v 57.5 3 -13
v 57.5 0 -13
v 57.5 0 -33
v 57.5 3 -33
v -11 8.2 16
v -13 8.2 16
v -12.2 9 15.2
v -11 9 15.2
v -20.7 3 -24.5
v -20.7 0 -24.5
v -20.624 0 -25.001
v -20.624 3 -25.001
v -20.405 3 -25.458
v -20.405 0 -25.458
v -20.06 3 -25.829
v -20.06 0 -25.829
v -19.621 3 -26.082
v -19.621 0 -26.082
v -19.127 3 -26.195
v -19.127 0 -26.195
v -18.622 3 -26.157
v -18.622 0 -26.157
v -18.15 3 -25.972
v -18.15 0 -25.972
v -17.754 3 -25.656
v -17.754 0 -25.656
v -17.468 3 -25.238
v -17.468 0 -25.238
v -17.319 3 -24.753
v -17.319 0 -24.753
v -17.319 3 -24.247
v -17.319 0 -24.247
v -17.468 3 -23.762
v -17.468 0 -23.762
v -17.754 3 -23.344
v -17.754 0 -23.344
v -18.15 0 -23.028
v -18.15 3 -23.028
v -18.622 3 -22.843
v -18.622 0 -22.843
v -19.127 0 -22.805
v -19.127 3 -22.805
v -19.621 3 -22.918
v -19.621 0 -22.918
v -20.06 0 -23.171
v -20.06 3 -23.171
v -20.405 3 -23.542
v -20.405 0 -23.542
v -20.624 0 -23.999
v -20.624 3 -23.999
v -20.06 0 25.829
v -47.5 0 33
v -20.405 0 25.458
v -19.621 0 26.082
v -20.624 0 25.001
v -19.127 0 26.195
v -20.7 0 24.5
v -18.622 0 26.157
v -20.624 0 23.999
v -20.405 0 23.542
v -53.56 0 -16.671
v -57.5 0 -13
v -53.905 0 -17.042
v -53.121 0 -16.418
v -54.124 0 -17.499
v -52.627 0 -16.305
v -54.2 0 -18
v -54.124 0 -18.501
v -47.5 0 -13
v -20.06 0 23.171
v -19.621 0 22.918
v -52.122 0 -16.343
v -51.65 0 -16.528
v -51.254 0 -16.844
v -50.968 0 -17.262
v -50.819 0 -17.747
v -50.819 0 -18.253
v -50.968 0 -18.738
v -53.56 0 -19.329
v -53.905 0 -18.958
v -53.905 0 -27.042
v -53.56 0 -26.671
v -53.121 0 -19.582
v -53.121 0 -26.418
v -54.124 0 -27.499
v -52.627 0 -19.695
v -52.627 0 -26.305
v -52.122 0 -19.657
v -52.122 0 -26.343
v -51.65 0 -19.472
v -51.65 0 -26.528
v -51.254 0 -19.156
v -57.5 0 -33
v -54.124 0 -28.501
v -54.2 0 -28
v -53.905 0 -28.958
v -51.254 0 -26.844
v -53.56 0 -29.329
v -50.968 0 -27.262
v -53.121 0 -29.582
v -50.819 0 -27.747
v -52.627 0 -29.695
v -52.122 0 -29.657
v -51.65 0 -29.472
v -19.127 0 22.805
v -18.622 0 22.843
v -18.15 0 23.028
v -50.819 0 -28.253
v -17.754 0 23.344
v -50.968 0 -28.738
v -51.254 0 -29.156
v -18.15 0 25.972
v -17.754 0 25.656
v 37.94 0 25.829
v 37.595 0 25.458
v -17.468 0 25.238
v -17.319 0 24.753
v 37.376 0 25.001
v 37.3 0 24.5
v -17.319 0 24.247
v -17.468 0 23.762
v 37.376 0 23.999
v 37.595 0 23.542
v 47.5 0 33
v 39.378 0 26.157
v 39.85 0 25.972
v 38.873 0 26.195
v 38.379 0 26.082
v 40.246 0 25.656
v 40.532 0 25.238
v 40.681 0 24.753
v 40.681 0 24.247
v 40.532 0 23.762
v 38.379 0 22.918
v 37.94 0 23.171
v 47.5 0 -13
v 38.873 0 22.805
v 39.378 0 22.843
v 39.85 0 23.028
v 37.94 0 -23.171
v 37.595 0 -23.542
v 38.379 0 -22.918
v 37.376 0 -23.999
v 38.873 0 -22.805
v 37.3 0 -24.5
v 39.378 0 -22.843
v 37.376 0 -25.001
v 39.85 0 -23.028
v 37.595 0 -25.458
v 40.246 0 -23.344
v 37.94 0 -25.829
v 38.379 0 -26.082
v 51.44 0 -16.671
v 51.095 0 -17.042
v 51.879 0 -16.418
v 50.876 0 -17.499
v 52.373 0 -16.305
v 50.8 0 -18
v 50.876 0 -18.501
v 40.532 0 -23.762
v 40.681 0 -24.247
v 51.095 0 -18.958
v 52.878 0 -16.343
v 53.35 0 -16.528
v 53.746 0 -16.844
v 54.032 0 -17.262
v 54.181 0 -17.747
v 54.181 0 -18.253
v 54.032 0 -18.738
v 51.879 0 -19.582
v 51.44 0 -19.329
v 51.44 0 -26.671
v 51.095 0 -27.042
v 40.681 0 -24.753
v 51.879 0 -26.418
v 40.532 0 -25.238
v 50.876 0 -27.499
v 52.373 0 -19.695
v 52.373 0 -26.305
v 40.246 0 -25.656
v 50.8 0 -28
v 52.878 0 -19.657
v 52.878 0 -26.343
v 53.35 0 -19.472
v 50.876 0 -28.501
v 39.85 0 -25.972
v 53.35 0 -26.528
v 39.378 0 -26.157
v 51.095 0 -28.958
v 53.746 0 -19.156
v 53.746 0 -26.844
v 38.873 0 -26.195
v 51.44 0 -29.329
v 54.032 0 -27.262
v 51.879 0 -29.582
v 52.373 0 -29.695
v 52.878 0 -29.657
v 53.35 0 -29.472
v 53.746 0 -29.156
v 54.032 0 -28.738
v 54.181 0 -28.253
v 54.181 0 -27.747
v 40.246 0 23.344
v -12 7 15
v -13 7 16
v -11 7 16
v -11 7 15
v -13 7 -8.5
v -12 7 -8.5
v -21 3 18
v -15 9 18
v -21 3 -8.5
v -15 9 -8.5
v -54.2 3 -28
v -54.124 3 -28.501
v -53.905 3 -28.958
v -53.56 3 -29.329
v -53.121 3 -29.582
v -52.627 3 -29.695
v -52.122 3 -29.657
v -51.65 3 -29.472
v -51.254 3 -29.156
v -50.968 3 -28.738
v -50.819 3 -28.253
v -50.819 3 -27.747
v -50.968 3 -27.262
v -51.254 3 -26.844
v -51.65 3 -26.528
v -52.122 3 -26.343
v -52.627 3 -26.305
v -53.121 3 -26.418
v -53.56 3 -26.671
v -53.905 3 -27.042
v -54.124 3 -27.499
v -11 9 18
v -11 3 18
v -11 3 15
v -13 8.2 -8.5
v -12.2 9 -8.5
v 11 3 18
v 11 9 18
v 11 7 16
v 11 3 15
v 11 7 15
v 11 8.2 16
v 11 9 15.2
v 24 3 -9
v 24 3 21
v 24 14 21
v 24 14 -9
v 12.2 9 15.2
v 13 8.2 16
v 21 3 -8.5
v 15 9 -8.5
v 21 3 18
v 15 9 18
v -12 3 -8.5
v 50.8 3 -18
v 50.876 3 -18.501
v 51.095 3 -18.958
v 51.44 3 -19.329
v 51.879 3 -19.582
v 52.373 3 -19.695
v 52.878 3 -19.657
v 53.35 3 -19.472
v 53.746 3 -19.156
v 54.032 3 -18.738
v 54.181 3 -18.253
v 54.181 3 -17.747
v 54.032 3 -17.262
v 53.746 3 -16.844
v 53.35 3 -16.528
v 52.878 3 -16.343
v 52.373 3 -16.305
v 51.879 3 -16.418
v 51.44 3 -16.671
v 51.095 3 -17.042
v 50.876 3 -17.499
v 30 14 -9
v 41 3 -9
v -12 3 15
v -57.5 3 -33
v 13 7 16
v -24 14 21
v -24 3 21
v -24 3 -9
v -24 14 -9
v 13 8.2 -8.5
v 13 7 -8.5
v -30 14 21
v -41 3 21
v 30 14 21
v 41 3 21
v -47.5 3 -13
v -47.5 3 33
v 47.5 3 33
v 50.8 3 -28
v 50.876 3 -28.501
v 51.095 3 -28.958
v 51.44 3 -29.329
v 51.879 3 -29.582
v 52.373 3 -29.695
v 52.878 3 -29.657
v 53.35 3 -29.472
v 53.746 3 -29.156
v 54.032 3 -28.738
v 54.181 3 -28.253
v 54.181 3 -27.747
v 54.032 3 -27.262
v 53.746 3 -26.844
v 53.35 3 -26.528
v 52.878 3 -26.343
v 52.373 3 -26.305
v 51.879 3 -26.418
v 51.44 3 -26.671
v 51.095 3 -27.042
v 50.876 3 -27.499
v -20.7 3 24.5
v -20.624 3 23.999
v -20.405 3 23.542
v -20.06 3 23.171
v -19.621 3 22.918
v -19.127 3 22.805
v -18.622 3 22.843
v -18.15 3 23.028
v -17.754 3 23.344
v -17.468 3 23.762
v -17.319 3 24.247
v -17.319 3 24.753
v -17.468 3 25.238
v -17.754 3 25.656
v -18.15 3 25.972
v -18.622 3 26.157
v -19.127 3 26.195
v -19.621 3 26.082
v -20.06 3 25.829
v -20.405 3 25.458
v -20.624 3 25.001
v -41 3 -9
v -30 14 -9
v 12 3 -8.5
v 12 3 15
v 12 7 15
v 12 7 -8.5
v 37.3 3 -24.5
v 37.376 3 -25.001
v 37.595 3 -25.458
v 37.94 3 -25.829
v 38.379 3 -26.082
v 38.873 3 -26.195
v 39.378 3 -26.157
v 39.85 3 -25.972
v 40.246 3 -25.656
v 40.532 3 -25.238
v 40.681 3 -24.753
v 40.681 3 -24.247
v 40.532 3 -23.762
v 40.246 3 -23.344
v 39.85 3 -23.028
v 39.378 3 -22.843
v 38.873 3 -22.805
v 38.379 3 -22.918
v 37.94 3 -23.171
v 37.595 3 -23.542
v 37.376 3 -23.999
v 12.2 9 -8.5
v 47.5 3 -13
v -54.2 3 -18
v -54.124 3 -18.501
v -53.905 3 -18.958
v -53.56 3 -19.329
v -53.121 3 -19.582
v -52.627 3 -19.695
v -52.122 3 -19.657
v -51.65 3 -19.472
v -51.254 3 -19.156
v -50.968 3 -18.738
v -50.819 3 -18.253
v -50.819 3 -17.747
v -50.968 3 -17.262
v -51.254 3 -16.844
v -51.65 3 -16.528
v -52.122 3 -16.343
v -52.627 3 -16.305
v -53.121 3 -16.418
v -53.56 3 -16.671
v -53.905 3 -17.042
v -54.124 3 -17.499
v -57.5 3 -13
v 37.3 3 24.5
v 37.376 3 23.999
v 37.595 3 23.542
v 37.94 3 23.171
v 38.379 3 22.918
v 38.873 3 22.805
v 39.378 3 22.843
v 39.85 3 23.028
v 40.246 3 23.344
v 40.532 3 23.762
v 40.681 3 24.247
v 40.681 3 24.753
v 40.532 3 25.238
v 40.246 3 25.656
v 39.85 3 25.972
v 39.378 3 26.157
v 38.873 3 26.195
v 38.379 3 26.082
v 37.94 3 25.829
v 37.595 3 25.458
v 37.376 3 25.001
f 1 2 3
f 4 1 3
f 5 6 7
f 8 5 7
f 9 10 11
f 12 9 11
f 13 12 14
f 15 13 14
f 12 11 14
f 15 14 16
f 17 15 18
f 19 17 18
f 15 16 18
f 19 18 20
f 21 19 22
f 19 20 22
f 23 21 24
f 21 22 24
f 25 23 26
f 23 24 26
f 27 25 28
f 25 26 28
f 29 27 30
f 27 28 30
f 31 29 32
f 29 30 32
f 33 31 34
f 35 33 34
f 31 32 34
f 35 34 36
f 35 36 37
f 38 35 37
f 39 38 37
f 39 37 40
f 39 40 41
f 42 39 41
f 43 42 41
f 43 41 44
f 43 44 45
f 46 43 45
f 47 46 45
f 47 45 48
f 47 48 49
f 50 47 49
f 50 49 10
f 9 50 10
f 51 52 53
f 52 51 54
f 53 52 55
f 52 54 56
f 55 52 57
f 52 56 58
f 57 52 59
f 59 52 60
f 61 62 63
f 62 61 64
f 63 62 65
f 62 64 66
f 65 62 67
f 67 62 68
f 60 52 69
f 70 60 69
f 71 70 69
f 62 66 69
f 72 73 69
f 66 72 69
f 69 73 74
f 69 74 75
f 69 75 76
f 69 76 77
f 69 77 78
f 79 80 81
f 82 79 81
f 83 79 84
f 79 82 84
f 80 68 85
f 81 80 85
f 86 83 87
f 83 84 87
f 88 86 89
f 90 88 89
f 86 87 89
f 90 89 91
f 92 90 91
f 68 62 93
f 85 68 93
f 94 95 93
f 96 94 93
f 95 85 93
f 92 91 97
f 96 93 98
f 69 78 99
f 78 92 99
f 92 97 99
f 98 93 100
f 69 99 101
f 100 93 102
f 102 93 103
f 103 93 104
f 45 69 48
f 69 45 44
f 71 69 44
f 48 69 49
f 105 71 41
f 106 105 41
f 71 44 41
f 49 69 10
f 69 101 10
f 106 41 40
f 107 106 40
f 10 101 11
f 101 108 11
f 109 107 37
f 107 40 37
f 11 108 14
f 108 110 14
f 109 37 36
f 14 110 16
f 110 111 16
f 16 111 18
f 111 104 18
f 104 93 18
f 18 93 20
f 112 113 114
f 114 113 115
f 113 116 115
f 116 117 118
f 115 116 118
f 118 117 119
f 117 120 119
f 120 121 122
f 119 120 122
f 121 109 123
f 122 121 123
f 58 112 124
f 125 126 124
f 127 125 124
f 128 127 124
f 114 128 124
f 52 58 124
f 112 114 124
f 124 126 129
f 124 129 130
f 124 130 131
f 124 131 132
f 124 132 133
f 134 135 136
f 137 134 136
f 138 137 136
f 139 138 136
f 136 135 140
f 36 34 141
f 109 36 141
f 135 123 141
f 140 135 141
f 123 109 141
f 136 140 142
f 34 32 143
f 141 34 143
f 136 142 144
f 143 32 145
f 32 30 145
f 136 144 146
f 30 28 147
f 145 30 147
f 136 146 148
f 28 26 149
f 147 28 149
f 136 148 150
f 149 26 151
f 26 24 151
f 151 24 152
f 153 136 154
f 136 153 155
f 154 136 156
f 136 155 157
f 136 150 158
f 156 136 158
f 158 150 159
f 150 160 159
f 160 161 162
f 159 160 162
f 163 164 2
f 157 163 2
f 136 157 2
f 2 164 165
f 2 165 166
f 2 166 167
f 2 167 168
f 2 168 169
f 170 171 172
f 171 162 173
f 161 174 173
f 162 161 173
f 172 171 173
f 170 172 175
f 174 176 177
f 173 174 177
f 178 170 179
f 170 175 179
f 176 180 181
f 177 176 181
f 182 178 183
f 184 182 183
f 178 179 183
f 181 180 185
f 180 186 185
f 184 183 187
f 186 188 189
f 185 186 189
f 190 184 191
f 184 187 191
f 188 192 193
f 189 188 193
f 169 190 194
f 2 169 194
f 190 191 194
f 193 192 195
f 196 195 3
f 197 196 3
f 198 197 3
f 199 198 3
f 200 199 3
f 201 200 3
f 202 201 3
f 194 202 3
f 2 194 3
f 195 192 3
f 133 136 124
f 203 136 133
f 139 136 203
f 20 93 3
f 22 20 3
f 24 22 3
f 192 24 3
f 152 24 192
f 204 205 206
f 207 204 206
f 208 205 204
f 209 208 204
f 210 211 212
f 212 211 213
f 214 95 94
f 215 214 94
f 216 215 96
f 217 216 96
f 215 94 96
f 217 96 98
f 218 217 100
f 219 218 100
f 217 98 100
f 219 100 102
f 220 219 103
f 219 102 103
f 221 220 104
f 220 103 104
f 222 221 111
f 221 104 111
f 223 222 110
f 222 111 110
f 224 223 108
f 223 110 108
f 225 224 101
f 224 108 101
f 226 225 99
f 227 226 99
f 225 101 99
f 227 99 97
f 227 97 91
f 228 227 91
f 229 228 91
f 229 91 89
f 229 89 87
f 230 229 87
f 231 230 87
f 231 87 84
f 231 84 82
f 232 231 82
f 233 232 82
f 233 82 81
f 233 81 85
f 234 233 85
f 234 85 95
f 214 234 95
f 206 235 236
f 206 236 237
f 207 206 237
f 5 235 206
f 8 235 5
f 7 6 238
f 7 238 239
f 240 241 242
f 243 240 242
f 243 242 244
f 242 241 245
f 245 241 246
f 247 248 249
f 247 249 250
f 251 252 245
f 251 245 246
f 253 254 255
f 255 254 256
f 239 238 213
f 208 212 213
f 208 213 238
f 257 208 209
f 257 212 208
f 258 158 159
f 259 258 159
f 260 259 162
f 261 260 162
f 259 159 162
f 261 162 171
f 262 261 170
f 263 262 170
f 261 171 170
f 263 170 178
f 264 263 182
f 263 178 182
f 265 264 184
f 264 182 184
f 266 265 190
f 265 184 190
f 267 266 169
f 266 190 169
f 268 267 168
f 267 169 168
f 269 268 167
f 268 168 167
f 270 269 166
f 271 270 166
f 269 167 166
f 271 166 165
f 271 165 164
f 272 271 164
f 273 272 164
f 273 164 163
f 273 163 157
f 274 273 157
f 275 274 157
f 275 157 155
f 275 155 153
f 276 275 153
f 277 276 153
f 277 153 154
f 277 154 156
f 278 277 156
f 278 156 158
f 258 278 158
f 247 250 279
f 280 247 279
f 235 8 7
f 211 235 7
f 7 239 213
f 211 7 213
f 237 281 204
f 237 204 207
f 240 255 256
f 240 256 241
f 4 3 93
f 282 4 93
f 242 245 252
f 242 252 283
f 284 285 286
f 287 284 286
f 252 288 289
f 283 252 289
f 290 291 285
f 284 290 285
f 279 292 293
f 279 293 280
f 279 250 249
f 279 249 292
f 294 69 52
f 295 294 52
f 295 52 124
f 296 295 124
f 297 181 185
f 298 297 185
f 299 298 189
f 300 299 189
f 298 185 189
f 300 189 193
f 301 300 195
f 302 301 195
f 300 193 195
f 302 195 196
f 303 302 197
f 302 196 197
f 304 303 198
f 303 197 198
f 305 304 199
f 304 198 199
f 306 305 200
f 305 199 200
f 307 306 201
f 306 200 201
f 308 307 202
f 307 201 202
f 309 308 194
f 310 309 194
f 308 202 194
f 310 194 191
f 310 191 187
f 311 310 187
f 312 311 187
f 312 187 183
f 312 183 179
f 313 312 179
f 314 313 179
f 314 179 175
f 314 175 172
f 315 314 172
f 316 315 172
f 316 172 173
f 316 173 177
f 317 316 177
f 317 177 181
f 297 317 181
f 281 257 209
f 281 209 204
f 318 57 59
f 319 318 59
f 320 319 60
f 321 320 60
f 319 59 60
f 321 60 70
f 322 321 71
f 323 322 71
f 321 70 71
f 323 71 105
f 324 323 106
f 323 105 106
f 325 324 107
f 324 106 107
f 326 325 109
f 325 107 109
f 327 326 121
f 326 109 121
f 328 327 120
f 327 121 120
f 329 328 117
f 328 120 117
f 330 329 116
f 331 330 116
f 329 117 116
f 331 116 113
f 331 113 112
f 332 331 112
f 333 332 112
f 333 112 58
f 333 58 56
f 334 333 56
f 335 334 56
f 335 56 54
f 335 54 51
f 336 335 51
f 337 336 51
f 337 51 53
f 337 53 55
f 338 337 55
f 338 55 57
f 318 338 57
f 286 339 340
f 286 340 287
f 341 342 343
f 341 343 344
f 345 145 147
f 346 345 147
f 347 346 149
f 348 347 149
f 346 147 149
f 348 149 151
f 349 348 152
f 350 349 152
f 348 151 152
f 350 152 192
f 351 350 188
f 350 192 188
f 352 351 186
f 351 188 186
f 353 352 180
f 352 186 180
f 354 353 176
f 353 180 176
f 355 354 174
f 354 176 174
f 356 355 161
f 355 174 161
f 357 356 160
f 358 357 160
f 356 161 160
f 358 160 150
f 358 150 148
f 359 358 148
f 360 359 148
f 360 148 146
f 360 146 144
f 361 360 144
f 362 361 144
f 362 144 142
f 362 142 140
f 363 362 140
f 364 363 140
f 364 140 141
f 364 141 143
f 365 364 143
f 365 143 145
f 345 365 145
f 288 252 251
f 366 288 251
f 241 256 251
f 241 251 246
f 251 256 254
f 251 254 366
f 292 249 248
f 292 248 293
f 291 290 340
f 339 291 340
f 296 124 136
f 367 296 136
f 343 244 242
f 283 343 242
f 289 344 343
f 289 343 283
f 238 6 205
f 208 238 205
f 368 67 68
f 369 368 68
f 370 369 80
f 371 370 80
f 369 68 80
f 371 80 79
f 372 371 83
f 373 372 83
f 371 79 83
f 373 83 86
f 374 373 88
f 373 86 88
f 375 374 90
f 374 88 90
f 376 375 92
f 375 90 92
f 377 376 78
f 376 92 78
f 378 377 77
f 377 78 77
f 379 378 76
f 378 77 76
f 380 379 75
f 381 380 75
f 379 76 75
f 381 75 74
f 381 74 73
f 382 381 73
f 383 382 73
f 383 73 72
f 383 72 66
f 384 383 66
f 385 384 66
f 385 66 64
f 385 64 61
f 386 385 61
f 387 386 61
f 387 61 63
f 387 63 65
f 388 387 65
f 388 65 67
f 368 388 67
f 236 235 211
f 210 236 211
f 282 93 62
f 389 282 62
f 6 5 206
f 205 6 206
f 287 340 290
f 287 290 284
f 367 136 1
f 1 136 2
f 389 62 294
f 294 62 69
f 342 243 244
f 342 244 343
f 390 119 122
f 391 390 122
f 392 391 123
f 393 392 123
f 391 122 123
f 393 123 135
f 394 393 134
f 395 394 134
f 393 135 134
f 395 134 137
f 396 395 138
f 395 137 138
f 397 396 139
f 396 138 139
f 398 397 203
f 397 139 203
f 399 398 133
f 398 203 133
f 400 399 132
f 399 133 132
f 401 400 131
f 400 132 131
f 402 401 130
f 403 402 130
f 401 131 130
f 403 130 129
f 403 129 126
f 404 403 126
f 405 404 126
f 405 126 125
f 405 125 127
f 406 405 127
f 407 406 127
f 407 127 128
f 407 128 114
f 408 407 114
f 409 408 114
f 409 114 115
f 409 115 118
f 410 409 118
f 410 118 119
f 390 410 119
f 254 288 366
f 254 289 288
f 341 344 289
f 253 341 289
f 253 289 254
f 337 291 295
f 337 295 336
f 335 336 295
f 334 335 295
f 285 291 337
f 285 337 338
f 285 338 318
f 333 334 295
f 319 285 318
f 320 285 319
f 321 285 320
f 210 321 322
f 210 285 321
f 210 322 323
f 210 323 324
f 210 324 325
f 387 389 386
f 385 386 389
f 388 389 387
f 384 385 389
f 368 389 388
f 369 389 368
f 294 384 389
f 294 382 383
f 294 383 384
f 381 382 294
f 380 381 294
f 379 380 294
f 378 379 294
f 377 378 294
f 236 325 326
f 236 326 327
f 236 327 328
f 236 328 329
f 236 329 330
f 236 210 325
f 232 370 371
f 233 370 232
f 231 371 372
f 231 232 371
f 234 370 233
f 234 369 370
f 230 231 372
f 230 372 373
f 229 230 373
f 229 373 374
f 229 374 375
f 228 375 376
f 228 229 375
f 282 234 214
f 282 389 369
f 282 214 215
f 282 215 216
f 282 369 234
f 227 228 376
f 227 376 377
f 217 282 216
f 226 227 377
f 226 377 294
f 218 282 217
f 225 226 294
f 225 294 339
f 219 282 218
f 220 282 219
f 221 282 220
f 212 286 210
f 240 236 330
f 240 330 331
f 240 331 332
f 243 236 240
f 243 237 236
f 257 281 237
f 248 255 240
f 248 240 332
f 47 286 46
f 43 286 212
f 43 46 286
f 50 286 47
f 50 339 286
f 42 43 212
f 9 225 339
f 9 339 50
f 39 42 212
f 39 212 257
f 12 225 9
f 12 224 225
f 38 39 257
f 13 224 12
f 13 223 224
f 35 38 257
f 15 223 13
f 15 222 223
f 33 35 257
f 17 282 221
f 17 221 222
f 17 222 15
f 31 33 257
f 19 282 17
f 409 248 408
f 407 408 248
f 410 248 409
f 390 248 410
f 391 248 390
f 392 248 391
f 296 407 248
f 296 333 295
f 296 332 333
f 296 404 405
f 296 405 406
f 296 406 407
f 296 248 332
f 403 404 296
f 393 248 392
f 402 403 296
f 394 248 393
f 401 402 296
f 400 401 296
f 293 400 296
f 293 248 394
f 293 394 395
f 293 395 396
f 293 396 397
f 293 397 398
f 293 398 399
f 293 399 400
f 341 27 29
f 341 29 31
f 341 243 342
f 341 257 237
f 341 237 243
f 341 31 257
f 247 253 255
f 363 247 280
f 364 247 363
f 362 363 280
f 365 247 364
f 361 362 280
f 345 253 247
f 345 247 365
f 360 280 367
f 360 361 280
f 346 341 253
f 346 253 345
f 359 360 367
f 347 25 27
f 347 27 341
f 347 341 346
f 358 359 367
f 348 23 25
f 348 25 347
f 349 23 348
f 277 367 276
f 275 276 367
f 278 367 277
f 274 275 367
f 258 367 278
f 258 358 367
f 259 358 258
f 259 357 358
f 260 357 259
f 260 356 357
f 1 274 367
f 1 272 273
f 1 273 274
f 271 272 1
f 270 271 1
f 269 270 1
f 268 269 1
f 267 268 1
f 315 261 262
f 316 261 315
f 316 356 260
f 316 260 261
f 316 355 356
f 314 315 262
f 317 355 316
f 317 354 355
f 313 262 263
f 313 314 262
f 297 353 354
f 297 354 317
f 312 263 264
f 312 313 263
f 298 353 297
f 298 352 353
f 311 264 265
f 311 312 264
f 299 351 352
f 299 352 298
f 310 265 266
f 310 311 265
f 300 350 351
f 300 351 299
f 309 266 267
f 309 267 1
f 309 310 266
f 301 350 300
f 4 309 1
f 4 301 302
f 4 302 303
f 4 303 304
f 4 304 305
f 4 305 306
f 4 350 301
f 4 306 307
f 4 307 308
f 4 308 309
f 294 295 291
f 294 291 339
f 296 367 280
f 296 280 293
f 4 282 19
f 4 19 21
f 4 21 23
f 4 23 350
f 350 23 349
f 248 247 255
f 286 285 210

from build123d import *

# Parameters (mm, degrees)
BOSS_EXTRUDE1_DEPTH  = 3
M3_CLEARANCE_HOLE1_D = 3.4
M3_CLEARANCE_HOLE2_D = 3.4
EXTRUDE_THIN1_DEPTH  = 6
SKETCH9_W            = 1
SKETCH9_H            = 1.2
CHAMFER1_SIZE        = 1
SKETCH11_W           = 22
SKETCH11_H           = 3
CUT_EXTRUDE1_DEPTH   = 6
SKETCH12_W           = 6
SKETCH12_H           = 30
BOSS_EXTRUDE3_DEPTH  = 11
CHAMFER2_SIZE        = 6
CHAMFER3_SIZE        = 11


# Some blends are built 0.0001 mm under size
with BuildPart() as part:
    # Sketch1 → Boss-Extrude1 (new body)
    with BuildSketch(Plane(origin=(0, 0, 0), x_dir=(1, 0, 0), z_dir=(0, 1, 0))):
        Polygon((-57.5, 33), (-57.5, 13), (-47.5, 13), (-47.5, -33), (47.5, -33), (47.5, 13), (57.5, 13), (57.5, 33), align=None)
    extrude(amount=BOSS_EXTRUDE1_DEPTH)

    # M3 Clearance Hole1 (through all)
    with Locations(Plane(origin=(0, 3, 0), x_dir=(1, 0, 0), z_dir=(0, 1, 0))):
        with Locations((-52.5, 28), (-52.5, 18), (52.5, 28), (52.5, 18)):
            Hole(M3_CLEARANCE_HOLE1_D / 2)

    # M3 Clearance Hole2 (through all)
    with Locations(Plane(origin=(0, 3, 0), x_dir=(1, 0, 0), z_dir=(0, 1, 0))):
        with Locations((-19, 24.5), (-19, -24.5), (39, -24.5), (39, 24.5)):
            Hole(M3_CLEARANCE_HOLE2_D / 2)

    # Sketch8 → Extrude-Thin1 (add)
    with BuildSketch(Plane(origin=(0, 3, 0), x_dir=(1, 0, 0), z_dir=(0, 1, 0))):
        Polygon((-12, 8.5), (-12, -15), (12, -15), (12, 8.5), (15, 8.5), (15, -18), (-15, -18), (-15, 8.5), align=None)
    extrude(amount=EXTRUDE_THIN1_DEPTH)

    # Cut-Sweep1: sweep along a path in Sketch10
    with BuildLine(Plane(origin=(0, 7.6, 0), x_dir=(1, 0, 0), z_dir=(0, 1, 0))) as cut_sweep1_path:
        Line((12, 8.5), (12, -15))
        Line((12, -15), (-12, -15))
        Line((-12, -15), (-12, 8.5))
    # Sketch9 → Cut-Sweep1 (sweep, cut)
    with BuildSketch(Plane(origin=(0, 0, -8.5), x_dir=(-1, 0, 0), z_dir=(0, 0, -1))):
        with Locations((-12.5, 7.6)):
            Rectangle(SKETCH9_W, SKETCH9_H)
    sweep(path=cut_sweep1_path.line, transition=Transition.RIGHT, mode=Mode.SUBTRACT)

    # Chamfer1
    # the kernel refuses this chamfer: 1 mm, written as the material it takes off along each edge
    with BuildSketch(Plane(origin=(-12, 8.2, 15), x_dir=(-0.9996219169112968, -0.0274958766105856, 0), z_dir=(0, 0, -1))) as chamfer1_piece_1_section:
        Polygon((CHAMFER1_SIZE * 0.999621916911, CHAMFER1_SIZE * 0.0274958766106), (-CHAMFER1_SIZE * 0.0274958766106, CHAMFER1_SIZE * 0.999621916911), (0, 0), align=None)
    chamfer1_piece_1 = extrude(amount=26.071682988, mode=Mode.PRIVATE)
    chamfer1_piece_1 = split(chamfer1_piece_1, bisect_by=Plane(origin=(-13, 8.530404154, 1.964158506), z_dir=(1, 0, 0)), keep=Keep.TOP, mode=Mode.PRIVATE)
    add(chamfer1_piece_1, mode=Mode.SUBTRACT)
    with BuildSketch(Plane(origin=(12, 8.2, 15), x_dir=(0, -0.0274958766105856, 0.9996219169112968), z_dir=(-1, 0, 0))) as chamfer1_piece_2_section:
        Polygon((CHAMFER1_SIZE * 0.999621916911, CHAMFER1_SIZE * 0.0274958766106), (-CHAMFER1_SIZE * 0.0274958766106, CHAMFER1_SIZE * 0.999621916911), (0, 0), align=None)
    chamfer1_piece_2 = extrude(amount=24, mode=Mode.PRIVATE)
    chamfer1_piece_2 = split(chamfer1_piece_2, bisect_by=Plane(origin=(0, 8.530404154, 16), z_dir=(0, 0, -1)), keep=Keep.TOP, mode=Mode.PRIVATE)
    add(chamfer1_piece_2, mode=Mode.SUBTRACT)
    with BuildSketch(Plane(origin=(12, 8.2, -11.071682988), x_dir=(0.9996219169112968, -0.027495876610585647, 0), z_dir=(0, 0, 1))) as chamfer1_piece_3_section:
        Polygon((CHAMFER1_SIZE * 0.999621916911, CHAMFER1_SIZE * 0.0274958766106), (-CHAMFER1_SIZE * 0.0274958766106, CHAMFER1_SIZE * 0.999621916911), (0, 0), align=None)
    chamfer1_piece_3 = extrude(amount=26.071682988, mode=Mode.PRIVATE)
    chamfer1_piece_3 = split(chamfer1_piece_3, bisect_by=Plane(origin=(13, 8.530404154, 1.964158506), z_dir=(-1, 0, 0)), keep=Keep.TOP, mode=Mode.PRIVATE)
    add(chamfer1_piece_3, mode=Mode.SUBTRACT)
    with BuildSketch(Plane(origin=(-12, 8.2, 17.571682988), x_dir=(-0.9996219169112968, -0.027495876610585647, 0), z_dir=(0, 0, -1))) as chamfer1_piece_4a_section:
        Polygon((CHAMFER1_SIZE * 0.999621916911, CHAMFER1_SIZE * 0.0274958766106), (-CHAMFER1_SIZE * 0.0274958766106, CHAMFER1_SIZE * 0.999621916911), (0, 0), align=None)
    chamfer1_piece_4a = extrude(amount=28.643365976, mode=Mode.PRIVATE)
    chamfer1_piece_4a = split(chamfer1_piece_4a, bisect_by=Plane(origin=(-13, 8.530404154, 15.5), z_dir=(1, 0, 0)), keep=Keep.TOP, mode=Mode.PRIVATE)
    chamfer1_piece_4a = split(chamfer1_piece_4a, bisect_by=Plane(origin=(-12.328634334, 8.530404154, 16), z_dir=(0, 0, -1)), keep=Keep.TOP, mode=Mode.PRIVATE)
    chamfer1_piece_4a = split(chamfer1_piece_4a, bisect_by=Plane(origin=(-12.328634334, 8.530404154, 15), z_dir=(0, 0, 1)), keep=Keep.TOP, mode=Mode.PRIVATE)
    with BuildSketch(Plane(origin=(12, 8.2, 15), x_dir=(0, -0.0274958766105856, 0.9996219169112968), z_dir=(-1, 0, 0))) as chamfer1_piece_4b_section:
        Polygon((CHAMFER1_SIZE * 0.999621916911, CHAMFER1_SIZE * 0.0274958766106), (-CHAMFER1_SIZE * 0.0274958766106, CHAMFER1_SIZE * 0.999621916911), (0, 0), align=None)
    chamfer1_piece_4b = extrude(amount=26.571682988, mode=Mode.PRIVATE)
    chamfer1_piece_4b = split(chamfer1_piece_4b, bisect_by=Plane(origin=(-13, 8.530404154, 15.328634334), z_dir=(1, 0, 0)), keep=Keep.TOP, mode=Mode.PRIVATE)
    chamfer1_piece_4b = split(chamfer1_piece_4b, bisect_by=Plane(origin=(-12.5, 8.530404154, 16), z_dir=(0, 0, -1)), keep=Keep.TOP, mode=Mode.PRIVATE)
    chamfer1_piece_4b = split(chamfer1_piece_4b, bisect_by=Plane(origin=(-12, 8.530404154, 15.328634334), z_dir=(-1, 0, 0)), keep=Keep.TOP, mode=Mode.PRIVATE)
    chamfer1_piece_4 = chamfer1_piece_4a & chamfer1_piece_4b
    add(chamfer1_piece_4, mode=Mode.SUBTRACT)
    with BuildSketch(Plane(origin=(12, 8.2, -11.071682988), x_dir=(0.9996219169112968, -0.027495876610585647, 0), z_dir=(0, 0, 1))) as chamfer1_piece_5a_section:
        Polygon((CHAMFER1_SIZE * 0.999621916911, CHAMFER1_SIZE * 0.0274958766106), (-CHAMFER1_SIZE * 0.0274958766106, CHAMFER1_SIZE * 0.999621916911), (0, 0), align=None)
    chamfer1_piece_5a = extrude(amount=28.643365976, mode=Mode.PRIVATE)
    chamfer1_piece_5a = split(chamfer1_piece_5a, bisect_by=Plane(origin=(13, 8.530404154, 15.5), z_dir=(-1, 0, 0)), keep=Keep.TOP, mode=Mode.PRIVATE)
    chamfer1_piece_5a = split(chamfer1_piece_5a, bisect_by=Plane(origin=(12.328634334, 8.530404154, 16), z_dir=(0, 0, -1)), keep=Keep.TOP, mode=Mode.PRIVATE)
    chamfer1_piece_5a = split(chamfer1_piece_5a, bisect_by=Plane(origin=(12.328634334, 8.530404154, 15), z_dir=(0, 0, 1)), keep=Keep.TOP, mode=Mode.PRIVATE)
    with BuildSketch(Plane(origin=(14.571682988, 8.2, 15), x_dir=(0, -0.0274958766105856, 0.9996219169112968), z_dir=(-1, 0, 0))) as chamfer1_piece_5b_section:
        Polygon((CHAMFER1_SIZE * 0.999621916911, CHAMFER1_SIZE * 0.0274958766106), (-CHAMFER1_SIZE * 0.0274958766106, CHAMFER1_SIZE * 0.999621916911), (0, 0), align=None)
    chamfer1_piece_5b = extrude(amount=26.571682988, mode=Mode.PRIVATE)
    chamfer1_piece_5b = split(chamfer1_piece_5b, bisect_by=Plane(origin=(13, 8.530404154, 15.328634334), z_dir=(-1, 0, 0)), keep=Keep.TOP, mode=Mode.PRIVATE)
    chamfer1_piece_5b = split(chamfer1_piece_5b, bisect_by=Plane(origin=(12.5, 8.530404154, 16), z_dir=(0, 0, -1)), keep=Keep.TOP, mode=Mode.PRIVATE)
    chamfer1_piece_5b = split(chamfer1_piece_5b, bisect_by=Plane(origin=(12, 8.530404154, 15.328634334), z_dir=(1, 0, 0)), keep=Keep.TOP, mode=Mode.PRIVATE)
    chamfer1_piece_5 = chamfer1_piece_5a & chamfer1_piece_5b
    add(chamfer1_piece_5, mode=Mode.SUBTRACT)

    # Sketch11 → Cut-Extrude1 (cut)
    with BuildSketch(Plane(origin=(0, 9, 0), x_dir=(1, 0, 0), z_dir=(0, 1, 0))):
        with Locations((0, -16.5)):
            Rectangle(SKETCH11_W, SKETCH11_H)
    extrude(amount=-CUT_EXTRUDE1_DEPTH, mode=Mode.SUBTRACT)

    # Sketch12 → Boss-Extrude3 (add)
    with BuildSketch(Plane(origin=(0, 3, 0), x_dir=(1, 0, 0), z_dir=(0, 1, 0))):
        with Locations((-27, -6)):
            Rectangle(SKETCH12_W, SKETCH12_H)
        with Locations((27, -6)):
            Rectangle(SKETCH12_W, SKETCH12_H)
    extrude(amount=BOSS_EXTRUDE3_DEPTH)

    # Chamfer2
    chamfer2_edges = [part.edges().sort_by_distance(p)[0] for p in [
        (15, 3, 4.75),
        (-15, 3, 4.75),
    ]]
    chamfer(chamfer2_edges, length=CHAMFER2_SIZE - 0.0001)  # a hair under: the kernel refuses the full size

    # Chamfer3
    chamfer3_edges = [part.edges().sort_by_distance(p)[0] for p in [
        (30, 3, 6),
        (-30, 3, 6),
    ]]
    chamfer(chamfer3_edges, length=CHAMFER3_SIZE - 0.0001)  # a hair under: the kernel refuses the full size


solid = part.part
